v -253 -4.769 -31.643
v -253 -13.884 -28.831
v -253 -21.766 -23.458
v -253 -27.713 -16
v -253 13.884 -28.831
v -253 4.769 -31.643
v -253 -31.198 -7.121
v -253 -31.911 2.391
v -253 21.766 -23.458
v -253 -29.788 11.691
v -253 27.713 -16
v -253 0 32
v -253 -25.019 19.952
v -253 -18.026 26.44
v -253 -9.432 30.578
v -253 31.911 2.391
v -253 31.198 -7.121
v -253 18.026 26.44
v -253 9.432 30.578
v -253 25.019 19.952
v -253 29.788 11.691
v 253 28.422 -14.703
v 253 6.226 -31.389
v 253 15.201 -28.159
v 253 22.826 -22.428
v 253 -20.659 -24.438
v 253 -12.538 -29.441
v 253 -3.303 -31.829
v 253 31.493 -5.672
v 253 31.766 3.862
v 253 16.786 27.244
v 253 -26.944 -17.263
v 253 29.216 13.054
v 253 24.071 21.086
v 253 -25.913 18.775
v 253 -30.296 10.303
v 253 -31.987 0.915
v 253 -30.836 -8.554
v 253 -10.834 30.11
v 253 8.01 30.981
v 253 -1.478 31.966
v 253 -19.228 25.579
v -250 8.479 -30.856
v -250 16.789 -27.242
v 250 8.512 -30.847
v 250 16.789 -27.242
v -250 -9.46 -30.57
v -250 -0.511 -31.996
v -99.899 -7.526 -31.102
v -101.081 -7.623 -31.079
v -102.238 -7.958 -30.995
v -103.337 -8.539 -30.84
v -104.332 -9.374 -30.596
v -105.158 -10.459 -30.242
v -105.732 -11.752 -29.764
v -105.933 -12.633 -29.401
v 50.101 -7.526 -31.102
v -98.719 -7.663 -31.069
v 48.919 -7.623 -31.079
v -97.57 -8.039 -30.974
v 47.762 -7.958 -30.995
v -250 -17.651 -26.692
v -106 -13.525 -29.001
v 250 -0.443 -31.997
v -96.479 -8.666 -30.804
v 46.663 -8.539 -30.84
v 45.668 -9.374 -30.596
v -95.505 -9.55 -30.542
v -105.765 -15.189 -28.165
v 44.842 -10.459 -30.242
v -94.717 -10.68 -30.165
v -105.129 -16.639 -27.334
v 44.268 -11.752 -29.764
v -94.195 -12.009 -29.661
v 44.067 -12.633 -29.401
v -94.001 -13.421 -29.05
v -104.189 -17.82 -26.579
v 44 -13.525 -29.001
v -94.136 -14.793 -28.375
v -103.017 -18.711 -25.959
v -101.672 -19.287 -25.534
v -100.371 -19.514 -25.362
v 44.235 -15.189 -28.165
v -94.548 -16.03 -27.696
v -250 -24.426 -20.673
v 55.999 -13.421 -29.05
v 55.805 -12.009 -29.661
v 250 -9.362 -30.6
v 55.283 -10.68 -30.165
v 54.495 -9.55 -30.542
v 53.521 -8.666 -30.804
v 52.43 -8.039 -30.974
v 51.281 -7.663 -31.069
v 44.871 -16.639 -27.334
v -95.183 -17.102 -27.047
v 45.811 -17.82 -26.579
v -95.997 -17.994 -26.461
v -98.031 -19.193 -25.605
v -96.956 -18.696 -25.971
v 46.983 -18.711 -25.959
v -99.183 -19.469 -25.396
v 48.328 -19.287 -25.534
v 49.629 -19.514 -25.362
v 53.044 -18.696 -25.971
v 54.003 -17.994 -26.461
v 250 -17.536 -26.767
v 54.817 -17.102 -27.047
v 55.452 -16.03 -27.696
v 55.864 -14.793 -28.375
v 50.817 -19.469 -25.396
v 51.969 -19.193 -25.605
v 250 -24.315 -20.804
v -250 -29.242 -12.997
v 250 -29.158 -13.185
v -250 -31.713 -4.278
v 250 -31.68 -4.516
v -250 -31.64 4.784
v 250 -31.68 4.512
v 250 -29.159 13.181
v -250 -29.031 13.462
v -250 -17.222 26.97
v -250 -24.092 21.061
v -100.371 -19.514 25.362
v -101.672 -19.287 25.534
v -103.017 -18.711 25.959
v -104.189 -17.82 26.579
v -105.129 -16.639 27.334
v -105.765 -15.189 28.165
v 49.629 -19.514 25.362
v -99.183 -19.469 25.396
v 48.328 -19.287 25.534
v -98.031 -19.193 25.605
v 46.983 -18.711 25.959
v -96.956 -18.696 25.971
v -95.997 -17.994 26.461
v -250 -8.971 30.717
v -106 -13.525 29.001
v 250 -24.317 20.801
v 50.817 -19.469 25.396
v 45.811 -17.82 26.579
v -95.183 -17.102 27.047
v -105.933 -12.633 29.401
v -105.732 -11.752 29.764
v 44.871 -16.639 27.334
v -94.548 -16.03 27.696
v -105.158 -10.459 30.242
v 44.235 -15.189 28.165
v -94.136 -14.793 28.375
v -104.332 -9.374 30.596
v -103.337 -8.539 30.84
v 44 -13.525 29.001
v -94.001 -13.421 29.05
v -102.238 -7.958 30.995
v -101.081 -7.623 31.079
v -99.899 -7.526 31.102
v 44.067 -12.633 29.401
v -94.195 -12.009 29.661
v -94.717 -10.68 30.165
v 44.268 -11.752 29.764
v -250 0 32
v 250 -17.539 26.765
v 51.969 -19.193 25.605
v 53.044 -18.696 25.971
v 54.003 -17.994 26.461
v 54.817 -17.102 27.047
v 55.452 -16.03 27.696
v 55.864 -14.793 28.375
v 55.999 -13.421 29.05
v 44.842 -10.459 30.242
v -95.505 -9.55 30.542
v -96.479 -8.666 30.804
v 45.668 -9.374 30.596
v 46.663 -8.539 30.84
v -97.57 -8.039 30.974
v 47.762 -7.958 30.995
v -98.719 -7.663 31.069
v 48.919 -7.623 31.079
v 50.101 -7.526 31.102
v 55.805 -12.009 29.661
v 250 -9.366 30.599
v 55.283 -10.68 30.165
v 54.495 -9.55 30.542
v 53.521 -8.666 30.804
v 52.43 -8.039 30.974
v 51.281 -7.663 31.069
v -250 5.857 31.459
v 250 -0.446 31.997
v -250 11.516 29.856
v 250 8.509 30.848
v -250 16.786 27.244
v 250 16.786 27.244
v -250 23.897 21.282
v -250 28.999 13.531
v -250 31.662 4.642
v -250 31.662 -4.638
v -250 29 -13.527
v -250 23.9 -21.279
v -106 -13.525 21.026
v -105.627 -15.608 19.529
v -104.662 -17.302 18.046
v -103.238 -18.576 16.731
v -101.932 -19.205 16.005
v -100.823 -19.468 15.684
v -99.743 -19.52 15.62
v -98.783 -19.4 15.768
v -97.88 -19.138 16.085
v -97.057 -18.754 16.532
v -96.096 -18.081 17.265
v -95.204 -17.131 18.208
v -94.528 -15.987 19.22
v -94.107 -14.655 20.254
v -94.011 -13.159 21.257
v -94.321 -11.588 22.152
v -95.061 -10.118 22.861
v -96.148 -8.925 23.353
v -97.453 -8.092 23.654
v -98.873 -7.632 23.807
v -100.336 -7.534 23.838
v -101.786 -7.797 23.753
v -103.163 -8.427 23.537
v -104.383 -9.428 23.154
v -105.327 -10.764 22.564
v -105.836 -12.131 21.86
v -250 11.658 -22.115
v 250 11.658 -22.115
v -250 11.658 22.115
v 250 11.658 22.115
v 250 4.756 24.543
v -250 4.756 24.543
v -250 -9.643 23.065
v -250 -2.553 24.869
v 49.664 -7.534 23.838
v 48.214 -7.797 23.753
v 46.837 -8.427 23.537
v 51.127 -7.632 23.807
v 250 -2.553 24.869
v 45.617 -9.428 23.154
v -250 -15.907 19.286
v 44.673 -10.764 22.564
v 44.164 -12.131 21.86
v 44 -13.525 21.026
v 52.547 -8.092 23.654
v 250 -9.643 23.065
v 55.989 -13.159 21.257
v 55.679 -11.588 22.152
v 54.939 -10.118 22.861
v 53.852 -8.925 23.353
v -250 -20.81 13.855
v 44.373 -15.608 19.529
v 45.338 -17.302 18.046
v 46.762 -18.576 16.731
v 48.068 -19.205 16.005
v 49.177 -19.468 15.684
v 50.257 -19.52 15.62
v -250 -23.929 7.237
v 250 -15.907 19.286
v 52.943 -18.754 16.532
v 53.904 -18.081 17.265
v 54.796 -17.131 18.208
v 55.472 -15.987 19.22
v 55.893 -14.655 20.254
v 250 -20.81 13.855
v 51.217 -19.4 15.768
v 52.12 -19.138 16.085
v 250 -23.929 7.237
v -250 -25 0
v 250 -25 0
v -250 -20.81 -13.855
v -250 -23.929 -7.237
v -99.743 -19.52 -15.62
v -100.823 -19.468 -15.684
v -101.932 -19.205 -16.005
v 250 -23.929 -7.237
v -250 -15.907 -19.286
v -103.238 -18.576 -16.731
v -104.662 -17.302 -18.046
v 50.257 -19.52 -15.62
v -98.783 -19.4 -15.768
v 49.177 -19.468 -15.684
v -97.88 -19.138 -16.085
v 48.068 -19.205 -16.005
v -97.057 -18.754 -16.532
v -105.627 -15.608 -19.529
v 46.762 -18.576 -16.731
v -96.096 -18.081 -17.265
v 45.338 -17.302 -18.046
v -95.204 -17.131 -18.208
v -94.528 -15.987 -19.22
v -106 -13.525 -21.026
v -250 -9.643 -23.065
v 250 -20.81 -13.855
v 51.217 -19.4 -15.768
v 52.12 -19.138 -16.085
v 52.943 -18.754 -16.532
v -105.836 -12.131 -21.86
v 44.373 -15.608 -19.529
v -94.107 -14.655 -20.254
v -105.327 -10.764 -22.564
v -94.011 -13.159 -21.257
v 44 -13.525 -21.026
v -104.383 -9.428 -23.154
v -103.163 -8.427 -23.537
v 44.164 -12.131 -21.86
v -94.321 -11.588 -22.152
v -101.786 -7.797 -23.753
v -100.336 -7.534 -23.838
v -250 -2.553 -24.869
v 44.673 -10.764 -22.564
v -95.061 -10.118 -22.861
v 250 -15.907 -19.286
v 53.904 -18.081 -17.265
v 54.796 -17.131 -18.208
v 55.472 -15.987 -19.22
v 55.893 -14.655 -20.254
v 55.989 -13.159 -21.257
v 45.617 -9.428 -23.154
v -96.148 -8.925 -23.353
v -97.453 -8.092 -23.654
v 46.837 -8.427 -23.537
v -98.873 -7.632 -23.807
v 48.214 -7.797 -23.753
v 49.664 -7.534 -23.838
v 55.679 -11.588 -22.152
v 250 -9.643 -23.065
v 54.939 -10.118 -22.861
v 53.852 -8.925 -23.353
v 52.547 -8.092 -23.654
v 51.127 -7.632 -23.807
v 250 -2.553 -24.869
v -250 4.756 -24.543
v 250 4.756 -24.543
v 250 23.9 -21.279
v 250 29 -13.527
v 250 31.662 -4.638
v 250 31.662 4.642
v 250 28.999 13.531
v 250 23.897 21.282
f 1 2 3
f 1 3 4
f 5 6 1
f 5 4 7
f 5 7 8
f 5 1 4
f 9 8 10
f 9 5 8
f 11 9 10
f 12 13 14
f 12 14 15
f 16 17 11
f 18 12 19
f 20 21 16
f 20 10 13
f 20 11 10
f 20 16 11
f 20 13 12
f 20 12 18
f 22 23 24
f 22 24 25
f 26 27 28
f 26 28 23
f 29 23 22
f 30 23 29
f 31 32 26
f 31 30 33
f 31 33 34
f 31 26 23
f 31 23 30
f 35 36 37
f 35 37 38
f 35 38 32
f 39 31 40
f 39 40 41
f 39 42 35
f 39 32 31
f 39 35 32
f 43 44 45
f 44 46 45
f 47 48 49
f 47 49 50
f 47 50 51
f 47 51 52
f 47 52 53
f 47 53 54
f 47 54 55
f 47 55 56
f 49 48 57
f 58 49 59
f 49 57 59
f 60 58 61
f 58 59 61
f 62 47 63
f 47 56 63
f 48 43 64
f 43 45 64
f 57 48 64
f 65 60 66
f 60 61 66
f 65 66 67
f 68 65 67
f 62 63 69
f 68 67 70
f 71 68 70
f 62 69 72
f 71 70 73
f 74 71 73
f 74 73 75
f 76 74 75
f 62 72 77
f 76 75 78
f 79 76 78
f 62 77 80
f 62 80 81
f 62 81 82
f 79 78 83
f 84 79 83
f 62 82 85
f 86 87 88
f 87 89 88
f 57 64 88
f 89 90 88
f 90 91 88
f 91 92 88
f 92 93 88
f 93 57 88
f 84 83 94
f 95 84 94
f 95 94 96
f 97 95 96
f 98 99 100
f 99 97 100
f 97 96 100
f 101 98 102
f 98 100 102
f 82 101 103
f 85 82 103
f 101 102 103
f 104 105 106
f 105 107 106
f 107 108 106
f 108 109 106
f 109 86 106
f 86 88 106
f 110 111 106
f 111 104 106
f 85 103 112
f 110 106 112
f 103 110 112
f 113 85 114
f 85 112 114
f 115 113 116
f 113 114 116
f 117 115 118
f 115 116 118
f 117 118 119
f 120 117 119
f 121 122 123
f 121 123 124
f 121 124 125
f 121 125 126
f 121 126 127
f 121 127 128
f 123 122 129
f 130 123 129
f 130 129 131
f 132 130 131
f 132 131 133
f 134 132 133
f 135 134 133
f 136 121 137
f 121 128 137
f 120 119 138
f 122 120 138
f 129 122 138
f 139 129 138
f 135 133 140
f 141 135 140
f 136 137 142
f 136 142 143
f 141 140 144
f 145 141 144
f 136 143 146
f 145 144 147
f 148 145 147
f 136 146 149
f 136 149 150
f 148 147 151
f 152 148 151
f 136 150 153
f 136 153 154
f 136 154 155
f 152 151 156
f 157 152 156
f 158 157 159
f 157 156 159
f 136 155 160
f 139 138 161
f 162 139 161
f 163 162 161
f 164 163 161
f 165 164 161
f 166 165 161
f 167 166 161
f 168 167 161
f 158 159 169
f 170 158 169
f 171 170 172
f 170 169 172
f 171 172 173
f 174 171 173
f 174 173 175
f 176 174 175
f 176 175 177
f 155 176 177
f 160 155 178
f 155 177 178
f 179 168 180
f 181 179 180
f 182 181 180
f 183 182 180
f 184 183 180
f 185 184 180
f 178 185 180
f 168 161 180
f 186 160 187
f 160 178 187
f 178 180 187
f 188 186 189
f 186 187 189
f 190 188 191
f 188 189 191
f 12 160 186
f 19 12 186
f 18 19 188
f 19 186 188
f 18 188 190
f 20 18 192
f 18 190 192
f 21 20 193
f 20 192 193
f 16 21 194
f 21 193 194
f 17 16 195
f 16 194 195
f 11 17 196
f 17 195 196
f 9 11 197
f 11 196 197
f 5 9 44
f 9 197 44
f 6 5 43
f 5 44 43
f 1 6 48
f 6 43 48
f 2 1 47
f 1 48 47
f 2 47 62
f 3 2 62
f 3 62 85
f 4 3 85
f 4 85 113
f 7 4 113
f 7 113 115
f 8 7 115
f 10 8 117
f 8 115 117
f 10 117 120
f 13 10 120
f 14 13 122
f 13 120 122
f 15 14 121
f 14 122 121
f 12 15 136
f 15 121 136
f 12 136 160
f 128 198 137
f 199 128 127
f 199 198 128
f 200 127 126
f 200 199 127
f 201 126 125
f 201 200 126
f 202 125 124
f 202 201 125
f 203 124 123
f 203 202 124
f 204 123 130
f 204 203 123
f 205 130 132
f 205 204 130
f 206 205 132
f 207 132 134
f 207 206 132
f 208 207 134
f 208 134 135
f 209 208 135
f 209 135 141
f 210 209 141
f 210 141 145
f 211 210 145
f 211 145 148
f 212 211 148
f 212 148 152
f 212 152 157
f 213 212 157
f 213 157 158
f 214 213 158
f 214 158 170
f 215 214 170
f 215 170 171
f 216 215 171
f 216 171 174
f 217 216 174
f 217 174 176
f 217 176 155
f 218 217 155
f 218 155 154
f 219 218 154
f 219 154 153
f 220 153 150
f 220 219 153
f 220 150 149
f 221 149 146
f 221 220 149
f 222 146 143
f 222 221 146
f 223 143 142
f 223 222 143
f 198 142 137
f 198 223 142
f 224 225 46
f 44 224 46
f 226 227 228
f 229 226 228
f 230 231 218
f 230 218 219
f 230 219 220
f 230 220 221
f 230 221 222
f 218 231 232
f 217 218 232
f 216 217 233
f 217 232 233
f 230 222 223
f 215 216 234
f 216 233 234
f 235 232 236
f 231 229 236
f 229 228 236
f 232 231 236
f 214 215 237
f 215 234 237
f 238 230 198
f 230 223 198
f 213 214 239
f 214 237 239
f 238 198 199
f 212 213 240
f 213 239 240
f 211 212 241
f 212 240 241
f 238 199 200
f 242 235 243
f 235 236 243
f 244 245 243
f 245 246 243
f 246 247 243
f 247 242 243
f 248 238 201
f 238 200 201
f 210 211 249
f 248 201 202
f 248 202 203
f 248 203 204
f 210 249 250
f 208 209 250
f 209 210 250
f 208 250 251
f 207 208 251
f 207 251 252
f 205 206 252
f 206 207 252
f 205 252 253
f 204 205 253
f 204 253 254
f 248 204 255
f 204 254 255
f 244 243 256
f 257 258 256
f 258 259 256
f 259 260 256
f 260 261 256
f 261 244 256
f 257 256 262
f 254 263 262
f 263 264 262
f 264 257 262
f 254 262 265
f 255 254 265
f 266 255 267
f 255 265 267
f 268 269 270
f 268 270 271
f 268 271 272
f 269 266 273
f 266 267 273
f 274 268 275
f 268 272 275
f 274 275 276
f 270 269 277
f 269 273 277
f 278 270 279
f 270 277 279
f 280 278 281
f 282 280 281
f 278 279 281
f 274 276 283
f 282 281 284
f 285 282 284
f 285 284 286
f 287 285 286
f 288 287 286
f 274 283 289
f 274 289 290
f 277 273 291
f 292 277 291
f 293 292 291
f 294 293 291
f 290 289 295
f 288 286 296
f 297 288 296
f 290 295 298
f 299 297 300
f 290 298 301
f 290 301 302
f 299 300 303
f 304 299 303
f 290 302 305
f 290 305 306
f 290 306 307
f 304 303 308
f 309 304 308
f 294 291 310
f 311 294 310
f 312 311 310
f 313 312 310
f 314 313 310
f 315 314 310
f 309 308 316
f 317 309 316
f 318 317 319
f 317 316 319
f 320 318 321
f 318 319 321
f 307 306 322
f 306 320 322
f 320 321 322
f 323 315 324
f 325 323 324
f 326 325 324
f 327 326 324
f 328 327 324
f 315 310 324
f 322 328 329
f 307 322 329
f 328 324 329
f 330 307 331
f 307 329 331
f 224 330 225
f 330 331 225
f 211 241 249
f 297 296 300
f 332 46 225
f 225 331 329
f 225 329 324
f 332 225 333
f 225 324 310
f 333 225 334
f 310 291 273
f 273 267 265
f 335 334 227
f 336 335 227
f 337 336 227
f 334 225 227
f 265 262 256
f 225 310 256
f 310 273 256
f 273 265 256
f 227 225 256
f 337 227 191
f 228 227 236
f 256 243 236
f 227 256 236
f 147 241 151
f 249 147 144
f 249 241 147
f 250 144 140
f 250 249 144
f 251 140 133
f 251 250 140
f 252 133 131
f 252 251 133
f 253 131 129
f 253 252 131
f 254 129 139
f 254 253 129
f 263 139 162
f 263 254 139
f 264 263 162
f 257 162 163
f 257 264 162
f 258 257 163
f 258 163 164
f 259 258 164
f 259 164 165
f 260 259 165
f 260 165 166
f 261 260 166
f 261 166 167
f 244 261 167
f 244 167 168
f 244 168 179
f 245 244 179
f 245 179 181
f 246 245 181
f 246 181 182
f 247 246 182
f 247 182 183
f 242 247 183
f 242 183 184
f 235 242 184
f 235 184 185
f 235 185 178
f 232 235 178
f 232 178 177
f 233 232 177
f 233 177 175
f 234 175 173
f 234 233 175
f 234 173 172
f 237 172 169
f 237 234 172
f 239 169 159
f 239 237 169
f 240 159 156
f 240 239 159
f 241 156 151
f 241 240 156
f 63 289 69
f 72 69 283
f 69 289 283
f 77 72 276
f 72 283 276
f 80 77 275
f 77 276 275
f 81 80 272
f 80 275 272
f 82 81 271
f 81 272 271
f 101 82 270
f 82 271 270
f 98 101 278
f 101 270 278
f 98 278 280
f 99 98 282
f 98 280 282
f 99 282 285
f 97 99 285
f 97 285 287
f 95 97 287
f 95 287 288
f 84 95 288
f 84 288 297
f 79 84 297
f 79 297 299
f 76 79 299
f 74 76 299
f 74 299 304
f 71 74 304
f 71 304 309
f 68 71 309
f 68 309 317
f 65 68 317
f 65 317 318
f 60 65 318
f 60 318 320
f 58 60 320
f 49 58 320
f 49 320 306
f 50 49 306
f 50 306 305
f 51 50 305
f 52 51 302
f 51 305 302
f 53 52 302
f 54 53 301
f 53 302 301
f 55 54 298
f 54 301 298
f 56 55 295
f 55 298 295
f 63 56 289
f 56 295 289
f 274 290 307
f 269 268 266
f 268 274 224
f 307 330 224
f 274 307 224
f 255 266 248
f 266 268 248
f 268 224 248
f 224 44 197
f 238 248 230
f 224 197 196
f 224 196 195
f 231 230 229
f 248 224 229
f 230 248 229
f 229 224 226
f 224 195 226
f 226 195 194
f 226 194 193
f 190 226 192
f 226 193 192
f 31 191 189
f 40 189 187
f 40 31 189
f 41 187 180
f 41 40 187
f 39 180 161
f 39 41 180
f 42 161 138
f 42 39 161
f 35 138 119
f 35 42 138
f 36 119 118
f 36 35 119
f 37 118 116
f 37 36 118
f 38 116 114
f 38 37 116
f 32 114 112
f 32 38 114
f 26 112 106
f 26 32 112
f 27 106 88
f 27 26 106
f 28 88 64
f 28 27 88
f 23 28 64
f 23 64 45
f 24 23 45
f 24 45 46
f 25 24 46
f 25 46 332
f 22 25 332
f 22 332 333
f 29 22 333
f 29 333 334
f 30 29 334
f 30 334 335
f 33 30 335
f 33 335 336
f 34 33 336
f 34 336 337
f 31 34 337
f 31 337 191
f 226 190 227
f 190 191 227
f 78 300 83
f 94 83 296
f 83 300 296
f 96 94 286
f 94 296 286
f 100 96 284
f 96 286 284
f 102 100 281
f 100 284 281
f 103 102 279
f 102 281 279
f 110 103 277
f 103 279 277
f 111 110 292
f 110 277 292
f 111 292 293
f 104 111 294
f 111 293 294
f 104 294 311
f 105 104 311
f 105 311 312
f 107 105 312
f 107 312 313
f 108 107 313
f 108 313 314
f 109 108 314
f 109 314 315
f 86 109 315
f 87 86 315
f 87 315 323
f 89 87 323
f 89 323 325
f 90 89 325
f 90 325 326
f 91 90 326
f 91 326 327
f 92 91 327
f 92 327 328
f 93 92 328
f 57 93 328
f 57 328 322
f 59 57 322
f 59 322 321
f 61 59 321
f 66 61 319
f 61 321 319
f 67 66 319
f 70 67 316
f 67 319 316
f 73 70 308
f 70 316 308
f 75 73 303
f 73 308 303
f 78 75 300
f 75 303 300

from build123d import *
from build123d.topology import SkipClean

# Parameters (mm, degrees)
RESSALTO_EXTRUS_O1_DEPTH          = 250
CORTE_EXTRUS_O2_REACH             = 256.063
ESBO_O4_R                         = 6
CORTE_EXTRUS_O2_DIRECTION_2_REACH = 256.063
RESSALTO_EXTRUS_O2_START          = 3
ESBO_O5_R                         = 32
RESSALTO_EXTRUS_O2_DEPTH          = 3
ESBO_O6_R                         = 32
RESSALTO_EXTRUS_O3_DEPTH          = 3


with BuildPart() as part:
    # Esboço1 → Ressalto-extrusão1 (new, symmetric)
    with BuildSketch(Plane(origin=(0, 0, 0), x_dir=(0, 0, -1), z_dir=(1, 0, 0))):
        with BuildLine():
            Line((22.115498803, 11.657817664), (27.241951671, 16.789165231))
            ThreePointArc((27.241951671, 16.789165231), (0.001842805, -31.999999947), (-27.243885188, 16.786027518))
            Line((-27.243885188, 16.786027518), (-22.115498803, 11.657817664))
            ThreePointArc((-22.115498803, 11.657817664), (0, -25), (22.115498803, 11.657817664))
        make_face()
    extrude(amount=RESSALTO_EXTRUS_O1_DEPTH, both=True)

    # Esboço4 → Corte-extrusão2 (cut, up to next)
    with BuildSketch(Plane.XY, mode=Mode.PRIVATE) as corte_extrus_o2_sk1:
        with Locations(Location((50, -13.525079078, 0), (0, 0, 180))):
            Circle(ESBO_O4_R)
    corte_extrus_o2_tool1 = extrude(corte_extrus_o2_sk1.sketch, amount=-CORTE_EXTRUS_O2_REACH, mode=Mode.PRIVATE) & part.part
    # Esboço4 → Corte-extrusão2 (cut, up to next)
    with BuildSketch(Plane.XY, mode=Mode.PRIVATE) as corte_extrus_o2_sk2:
        with Locations(Location((-100, -13.525079078, 0), (0, 0, 180))):
            Circle(ESBO_O4_R)
    corte_extrus_o2_tool2 = extrude(corte_extrus_o2_sk2.sketch, amount=-CORTE_EXTRUS_O2_REACH, mode=Mode.PRIVATE) & part.part
    add(corte_extrus_o2_tool1.solids().sort_by_distance((50, -13.525079, 0))[0], mode=Mode.SUBTRACT)
    add(corte_extrus_o2_tool2.solids().sort_by_distance((-100, -13.525079, 0))[0], mode=Mode.SUBTRACT)

    # Esboço4 → Corte-extrusão2 direction 2 (cut, up to next)
    with BuildSketch(Plane.XY, mode=Mode.PRIVATE) as corte_extrus_o2_direction_2_sk1:
        with Locations(Location((50, -13.525079078, 0), (0, 0, 180))):
            Circle(ESBO_O4_R)
    corte_extrus_o2_direction_2_tool1 = extrude(corte_extrus_o2_direction_2_sk1.sketch, amount=CORTE_EXTRUS_O2_DIRECTION_2_REACH, mode=Mode.PRIVATE) & part.part
    # Esboço4 → Corte-extrusão2 direction 2 (cut, up to next)
    with BuildSketch(Plane.XY, mode=Mode.PRIVATE) as corte_extrus_o2_direction_2_sk2:
        with Locations(Location((-100, -13.525079078, 0), (0, 0, 180))):
            Circle(ESBO_O4_R)
    corte_extrus_o2_direction_2_tool2 = extrude(corte_extrus_o2_direction_2_sk2.sketch, amount=CORTE_EXTRUS_O2_DIRECTION_2_REACH, mode=Mode.PRIVATE) & part.part
    add(corte_extrus_o2_direction_2_tool1.solids().sort_by_distance((50, -13.525079, 0))[0], mode=Mode.SUBTRACT)
    add(corte_extrus_o2_direction_2_tool2.solids().sort_by_distance((-100, -13.525079, 0))[0], mode=Mode.SUBTRACT)

    # Esboço5 → Ressalto-extrusão2 (add)
    with SkipClean():  # the faces are left unmerged after this step: merging them gives an invalid solid
        with BuildSketch(Plane(origin=(250, 0, 0), x_dir=(0, 0, -1), z_dir=(1, 0, 0)).offset(RESSALTO_EXTRUS_O2_START)):
            with Locations(Location((0, 0, 0), (0, 0, 148.36114649))):
                Circle(ESBO_O5_R)
        extrude(amount=-RESSALTO_EXTRUS_O2_DEPTH)

    # Esboço6 → Ressalto-extrusão3 (add)
    with SkipClean():  # the faces are left unmerged after this step: merging them gives an invalid solid
        with BuildSketch(Plane.ZY.offset(250)):
            Circle(ESBO_O6_R)
        extrude(amount=RESSALTO_EXTRUS_O3_DEPTH)


solid = part.part
